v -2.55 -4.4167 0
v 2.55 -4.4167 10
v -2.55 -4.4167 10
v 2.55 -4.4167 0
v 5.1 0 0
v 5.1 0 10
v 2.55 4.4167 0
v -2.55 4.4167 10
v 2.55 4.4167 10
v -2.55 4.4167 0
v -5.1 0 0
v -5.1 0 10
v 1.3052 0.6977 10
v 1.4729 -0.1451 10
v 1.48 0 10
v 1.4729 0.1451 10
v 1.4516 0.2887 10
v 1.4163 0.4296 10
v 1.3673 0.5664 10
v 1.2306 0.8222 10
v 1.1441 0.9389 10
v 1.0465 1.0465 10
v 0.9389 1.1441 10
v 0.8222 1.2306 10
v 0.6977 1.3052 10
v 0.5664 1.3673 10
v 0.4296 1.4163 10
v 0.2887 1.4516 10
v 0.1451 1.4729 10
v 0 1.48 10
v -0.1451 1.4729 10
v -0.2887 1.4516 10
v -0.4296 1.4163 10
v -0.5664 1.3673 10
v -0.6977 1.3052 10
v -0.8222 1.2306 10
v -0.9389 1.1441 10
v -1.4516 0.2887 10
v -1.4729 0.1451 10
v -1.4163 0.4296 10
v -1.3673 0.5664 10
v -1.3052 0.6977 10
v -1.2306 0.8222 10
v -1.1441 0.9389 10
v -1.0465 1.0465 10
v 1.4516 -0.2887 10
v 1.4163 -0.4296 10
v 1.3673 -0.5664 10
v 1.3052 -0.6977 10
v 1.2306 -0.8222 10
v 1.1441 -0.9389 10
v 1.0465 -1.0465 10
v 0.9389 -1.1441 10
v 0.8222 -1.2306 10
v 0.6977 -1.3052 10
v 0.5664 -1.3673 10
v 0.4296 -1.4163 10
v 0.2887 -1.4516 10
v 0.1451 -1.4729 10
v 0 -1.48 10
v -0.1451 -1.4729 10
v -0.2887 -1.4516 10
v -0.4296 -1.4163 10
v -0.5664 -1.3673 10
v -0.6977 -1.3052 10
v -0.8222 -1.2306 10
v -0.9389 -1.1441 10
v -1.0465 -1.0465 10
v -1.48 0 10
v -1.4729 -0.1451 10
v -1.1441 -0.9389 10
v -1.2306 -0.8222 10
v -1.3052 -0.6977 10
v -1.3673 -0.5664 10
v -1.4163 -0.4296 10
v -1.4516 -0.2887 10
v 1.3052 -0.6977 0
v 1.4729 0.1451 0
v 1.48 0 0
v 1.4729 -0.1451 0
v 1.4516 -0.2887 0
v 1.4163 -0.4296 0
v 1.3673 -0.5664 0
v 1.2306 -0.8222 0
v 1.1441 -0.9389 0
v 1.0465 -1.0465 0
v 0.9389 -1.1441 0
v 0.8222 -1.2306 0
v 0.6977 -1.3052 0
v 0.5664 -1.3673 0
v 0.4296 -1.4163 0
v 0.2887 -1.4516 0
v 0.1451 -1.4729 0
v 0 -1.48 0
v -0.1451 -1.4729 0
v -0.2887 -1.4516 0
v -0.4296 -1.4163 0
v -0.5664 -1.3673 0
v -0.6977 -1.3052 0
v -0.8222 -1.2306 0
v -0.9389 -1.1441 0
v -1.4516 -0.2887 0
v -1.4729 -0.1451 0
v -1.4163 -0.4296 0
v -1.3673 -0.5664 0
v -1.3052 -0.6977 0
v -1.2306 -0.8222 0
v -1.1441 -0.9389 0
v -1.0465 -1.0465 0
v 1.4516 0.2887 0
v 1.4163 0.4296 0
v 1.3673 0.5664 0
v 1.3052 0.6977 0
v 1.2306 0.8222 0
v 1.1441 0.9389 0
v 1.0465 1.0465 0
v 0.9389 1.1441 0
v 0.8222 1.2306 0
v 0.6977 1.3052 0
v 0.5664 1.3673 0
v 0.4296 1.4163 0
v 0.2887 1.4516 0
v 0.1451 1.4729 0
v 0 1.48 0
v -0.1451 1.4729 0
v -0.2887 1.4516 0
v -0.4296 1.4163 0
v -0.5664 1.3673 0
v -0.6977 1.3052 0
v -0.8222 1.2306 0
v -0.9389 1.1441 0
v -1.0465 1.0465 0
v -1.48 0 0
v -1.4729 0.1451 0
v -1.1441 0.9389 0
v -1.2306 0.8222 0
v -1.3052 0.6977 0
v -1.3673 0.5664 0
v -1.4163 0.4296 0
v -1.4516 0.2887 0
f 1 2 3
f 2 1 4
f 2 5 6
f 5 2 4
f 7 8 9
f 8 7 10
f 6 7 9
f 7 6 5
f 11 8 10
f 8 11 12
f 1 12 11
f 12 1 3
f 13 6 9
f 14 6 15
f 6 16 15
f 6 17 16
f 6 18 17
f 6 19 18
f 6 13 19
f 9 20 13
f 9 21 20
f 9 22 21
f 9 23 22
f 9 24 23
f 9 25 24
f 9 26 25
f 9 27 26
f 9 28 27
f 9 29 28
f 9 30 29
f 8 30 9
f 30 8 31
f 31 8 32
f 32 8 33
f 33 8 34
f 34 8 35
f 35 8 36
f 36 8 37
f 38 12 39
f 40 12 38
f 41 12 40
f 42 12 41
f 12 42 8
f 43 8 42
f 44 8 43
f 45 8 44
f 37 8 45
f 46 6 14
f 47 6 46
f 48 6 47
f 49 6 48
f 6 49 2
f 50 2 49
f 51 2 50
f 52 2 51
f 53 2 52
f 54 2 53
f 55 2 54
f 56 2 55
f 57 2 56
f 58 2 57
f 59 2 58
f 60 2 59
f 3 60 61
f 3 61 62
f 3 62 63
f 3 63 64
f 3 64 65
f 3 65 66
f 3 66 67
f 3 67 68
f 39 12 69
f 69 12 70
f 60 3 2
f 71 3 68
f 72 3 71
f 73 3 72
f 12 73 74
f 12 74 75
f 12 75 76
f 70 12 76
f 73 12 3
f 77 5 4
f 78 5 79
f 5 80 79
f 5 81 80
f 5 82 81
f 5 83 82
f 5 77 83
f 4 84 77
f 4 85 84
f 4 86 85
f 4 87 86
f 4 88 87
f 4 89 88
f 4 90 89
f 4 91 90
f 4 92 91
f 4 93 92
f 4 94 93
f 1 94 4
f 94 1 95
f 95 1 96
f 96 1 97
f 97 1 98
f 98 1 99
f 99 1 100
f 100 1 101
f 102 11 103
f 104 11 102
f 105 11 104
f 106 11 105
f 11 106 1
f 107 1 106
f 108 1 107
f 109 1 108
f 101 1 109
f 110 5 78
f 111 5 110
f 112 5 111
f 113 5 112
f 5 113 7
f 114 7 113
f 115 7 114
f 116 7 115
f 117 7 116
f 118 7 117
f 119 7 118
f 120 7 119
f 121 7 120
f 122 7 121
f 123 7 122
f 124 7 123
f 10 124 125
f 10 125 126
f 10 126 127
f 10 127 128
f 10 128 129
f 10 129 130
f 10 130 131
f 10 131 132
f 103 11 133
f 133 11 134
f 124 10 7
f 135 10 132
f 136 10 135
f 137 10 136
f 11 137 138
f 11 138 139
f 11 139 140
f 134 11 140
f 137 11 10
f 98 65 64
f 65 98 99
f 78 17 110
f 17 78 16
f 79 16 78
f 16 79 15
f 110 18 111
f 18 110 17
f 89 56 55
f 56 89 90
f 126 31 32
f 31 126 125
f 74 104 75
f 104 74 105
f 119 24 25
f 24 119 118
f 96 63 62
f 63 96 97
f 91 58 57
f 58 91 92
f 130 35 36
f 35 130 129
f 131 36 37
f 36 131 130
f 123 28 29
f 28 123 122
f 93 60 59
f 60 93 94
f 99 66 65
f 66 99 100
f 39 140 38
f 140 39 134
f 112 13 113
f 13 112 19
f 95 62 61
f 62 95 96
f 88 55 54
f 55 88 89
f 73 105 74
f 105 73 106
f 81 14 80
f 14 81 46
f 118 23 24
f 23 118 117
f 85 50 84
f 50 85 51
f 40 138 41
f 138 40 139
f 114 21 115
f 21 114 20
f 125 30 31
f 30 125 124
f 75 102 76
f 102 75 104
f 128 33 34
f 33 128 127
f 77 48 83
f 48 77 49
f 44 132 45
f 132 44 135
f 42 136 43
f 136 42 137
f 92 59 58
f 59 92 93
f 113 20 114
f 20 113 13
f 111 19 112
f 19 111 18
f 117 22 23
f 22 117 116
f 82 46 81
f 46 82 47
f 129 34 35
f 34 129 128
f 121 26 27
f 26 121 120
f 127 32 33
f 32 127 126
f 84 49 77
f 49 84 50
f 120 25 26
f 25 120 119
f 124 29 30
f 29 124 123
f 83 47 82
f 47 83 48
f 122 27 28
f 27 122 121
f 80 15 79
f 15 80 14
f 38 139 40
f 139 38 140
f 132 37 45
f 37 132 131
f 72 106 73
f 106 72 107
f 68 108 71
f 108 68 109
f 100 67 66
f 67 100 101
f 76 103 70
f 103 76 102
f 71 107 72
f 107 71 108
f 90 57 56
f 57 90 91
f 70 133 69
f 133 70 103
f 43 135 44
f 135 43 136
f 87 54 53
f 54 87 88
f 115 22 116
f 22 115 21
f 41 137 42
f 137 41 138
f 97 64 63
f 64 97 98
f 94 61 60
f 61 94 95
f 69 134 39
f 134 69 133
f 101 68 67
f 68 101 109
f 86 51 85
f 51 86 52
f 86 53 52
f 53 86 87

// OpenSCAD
difference() {
cylinder(r=5.1, h=10, $fn=6);
cylinder(r=1.48, h=10, $fn=64);
}
